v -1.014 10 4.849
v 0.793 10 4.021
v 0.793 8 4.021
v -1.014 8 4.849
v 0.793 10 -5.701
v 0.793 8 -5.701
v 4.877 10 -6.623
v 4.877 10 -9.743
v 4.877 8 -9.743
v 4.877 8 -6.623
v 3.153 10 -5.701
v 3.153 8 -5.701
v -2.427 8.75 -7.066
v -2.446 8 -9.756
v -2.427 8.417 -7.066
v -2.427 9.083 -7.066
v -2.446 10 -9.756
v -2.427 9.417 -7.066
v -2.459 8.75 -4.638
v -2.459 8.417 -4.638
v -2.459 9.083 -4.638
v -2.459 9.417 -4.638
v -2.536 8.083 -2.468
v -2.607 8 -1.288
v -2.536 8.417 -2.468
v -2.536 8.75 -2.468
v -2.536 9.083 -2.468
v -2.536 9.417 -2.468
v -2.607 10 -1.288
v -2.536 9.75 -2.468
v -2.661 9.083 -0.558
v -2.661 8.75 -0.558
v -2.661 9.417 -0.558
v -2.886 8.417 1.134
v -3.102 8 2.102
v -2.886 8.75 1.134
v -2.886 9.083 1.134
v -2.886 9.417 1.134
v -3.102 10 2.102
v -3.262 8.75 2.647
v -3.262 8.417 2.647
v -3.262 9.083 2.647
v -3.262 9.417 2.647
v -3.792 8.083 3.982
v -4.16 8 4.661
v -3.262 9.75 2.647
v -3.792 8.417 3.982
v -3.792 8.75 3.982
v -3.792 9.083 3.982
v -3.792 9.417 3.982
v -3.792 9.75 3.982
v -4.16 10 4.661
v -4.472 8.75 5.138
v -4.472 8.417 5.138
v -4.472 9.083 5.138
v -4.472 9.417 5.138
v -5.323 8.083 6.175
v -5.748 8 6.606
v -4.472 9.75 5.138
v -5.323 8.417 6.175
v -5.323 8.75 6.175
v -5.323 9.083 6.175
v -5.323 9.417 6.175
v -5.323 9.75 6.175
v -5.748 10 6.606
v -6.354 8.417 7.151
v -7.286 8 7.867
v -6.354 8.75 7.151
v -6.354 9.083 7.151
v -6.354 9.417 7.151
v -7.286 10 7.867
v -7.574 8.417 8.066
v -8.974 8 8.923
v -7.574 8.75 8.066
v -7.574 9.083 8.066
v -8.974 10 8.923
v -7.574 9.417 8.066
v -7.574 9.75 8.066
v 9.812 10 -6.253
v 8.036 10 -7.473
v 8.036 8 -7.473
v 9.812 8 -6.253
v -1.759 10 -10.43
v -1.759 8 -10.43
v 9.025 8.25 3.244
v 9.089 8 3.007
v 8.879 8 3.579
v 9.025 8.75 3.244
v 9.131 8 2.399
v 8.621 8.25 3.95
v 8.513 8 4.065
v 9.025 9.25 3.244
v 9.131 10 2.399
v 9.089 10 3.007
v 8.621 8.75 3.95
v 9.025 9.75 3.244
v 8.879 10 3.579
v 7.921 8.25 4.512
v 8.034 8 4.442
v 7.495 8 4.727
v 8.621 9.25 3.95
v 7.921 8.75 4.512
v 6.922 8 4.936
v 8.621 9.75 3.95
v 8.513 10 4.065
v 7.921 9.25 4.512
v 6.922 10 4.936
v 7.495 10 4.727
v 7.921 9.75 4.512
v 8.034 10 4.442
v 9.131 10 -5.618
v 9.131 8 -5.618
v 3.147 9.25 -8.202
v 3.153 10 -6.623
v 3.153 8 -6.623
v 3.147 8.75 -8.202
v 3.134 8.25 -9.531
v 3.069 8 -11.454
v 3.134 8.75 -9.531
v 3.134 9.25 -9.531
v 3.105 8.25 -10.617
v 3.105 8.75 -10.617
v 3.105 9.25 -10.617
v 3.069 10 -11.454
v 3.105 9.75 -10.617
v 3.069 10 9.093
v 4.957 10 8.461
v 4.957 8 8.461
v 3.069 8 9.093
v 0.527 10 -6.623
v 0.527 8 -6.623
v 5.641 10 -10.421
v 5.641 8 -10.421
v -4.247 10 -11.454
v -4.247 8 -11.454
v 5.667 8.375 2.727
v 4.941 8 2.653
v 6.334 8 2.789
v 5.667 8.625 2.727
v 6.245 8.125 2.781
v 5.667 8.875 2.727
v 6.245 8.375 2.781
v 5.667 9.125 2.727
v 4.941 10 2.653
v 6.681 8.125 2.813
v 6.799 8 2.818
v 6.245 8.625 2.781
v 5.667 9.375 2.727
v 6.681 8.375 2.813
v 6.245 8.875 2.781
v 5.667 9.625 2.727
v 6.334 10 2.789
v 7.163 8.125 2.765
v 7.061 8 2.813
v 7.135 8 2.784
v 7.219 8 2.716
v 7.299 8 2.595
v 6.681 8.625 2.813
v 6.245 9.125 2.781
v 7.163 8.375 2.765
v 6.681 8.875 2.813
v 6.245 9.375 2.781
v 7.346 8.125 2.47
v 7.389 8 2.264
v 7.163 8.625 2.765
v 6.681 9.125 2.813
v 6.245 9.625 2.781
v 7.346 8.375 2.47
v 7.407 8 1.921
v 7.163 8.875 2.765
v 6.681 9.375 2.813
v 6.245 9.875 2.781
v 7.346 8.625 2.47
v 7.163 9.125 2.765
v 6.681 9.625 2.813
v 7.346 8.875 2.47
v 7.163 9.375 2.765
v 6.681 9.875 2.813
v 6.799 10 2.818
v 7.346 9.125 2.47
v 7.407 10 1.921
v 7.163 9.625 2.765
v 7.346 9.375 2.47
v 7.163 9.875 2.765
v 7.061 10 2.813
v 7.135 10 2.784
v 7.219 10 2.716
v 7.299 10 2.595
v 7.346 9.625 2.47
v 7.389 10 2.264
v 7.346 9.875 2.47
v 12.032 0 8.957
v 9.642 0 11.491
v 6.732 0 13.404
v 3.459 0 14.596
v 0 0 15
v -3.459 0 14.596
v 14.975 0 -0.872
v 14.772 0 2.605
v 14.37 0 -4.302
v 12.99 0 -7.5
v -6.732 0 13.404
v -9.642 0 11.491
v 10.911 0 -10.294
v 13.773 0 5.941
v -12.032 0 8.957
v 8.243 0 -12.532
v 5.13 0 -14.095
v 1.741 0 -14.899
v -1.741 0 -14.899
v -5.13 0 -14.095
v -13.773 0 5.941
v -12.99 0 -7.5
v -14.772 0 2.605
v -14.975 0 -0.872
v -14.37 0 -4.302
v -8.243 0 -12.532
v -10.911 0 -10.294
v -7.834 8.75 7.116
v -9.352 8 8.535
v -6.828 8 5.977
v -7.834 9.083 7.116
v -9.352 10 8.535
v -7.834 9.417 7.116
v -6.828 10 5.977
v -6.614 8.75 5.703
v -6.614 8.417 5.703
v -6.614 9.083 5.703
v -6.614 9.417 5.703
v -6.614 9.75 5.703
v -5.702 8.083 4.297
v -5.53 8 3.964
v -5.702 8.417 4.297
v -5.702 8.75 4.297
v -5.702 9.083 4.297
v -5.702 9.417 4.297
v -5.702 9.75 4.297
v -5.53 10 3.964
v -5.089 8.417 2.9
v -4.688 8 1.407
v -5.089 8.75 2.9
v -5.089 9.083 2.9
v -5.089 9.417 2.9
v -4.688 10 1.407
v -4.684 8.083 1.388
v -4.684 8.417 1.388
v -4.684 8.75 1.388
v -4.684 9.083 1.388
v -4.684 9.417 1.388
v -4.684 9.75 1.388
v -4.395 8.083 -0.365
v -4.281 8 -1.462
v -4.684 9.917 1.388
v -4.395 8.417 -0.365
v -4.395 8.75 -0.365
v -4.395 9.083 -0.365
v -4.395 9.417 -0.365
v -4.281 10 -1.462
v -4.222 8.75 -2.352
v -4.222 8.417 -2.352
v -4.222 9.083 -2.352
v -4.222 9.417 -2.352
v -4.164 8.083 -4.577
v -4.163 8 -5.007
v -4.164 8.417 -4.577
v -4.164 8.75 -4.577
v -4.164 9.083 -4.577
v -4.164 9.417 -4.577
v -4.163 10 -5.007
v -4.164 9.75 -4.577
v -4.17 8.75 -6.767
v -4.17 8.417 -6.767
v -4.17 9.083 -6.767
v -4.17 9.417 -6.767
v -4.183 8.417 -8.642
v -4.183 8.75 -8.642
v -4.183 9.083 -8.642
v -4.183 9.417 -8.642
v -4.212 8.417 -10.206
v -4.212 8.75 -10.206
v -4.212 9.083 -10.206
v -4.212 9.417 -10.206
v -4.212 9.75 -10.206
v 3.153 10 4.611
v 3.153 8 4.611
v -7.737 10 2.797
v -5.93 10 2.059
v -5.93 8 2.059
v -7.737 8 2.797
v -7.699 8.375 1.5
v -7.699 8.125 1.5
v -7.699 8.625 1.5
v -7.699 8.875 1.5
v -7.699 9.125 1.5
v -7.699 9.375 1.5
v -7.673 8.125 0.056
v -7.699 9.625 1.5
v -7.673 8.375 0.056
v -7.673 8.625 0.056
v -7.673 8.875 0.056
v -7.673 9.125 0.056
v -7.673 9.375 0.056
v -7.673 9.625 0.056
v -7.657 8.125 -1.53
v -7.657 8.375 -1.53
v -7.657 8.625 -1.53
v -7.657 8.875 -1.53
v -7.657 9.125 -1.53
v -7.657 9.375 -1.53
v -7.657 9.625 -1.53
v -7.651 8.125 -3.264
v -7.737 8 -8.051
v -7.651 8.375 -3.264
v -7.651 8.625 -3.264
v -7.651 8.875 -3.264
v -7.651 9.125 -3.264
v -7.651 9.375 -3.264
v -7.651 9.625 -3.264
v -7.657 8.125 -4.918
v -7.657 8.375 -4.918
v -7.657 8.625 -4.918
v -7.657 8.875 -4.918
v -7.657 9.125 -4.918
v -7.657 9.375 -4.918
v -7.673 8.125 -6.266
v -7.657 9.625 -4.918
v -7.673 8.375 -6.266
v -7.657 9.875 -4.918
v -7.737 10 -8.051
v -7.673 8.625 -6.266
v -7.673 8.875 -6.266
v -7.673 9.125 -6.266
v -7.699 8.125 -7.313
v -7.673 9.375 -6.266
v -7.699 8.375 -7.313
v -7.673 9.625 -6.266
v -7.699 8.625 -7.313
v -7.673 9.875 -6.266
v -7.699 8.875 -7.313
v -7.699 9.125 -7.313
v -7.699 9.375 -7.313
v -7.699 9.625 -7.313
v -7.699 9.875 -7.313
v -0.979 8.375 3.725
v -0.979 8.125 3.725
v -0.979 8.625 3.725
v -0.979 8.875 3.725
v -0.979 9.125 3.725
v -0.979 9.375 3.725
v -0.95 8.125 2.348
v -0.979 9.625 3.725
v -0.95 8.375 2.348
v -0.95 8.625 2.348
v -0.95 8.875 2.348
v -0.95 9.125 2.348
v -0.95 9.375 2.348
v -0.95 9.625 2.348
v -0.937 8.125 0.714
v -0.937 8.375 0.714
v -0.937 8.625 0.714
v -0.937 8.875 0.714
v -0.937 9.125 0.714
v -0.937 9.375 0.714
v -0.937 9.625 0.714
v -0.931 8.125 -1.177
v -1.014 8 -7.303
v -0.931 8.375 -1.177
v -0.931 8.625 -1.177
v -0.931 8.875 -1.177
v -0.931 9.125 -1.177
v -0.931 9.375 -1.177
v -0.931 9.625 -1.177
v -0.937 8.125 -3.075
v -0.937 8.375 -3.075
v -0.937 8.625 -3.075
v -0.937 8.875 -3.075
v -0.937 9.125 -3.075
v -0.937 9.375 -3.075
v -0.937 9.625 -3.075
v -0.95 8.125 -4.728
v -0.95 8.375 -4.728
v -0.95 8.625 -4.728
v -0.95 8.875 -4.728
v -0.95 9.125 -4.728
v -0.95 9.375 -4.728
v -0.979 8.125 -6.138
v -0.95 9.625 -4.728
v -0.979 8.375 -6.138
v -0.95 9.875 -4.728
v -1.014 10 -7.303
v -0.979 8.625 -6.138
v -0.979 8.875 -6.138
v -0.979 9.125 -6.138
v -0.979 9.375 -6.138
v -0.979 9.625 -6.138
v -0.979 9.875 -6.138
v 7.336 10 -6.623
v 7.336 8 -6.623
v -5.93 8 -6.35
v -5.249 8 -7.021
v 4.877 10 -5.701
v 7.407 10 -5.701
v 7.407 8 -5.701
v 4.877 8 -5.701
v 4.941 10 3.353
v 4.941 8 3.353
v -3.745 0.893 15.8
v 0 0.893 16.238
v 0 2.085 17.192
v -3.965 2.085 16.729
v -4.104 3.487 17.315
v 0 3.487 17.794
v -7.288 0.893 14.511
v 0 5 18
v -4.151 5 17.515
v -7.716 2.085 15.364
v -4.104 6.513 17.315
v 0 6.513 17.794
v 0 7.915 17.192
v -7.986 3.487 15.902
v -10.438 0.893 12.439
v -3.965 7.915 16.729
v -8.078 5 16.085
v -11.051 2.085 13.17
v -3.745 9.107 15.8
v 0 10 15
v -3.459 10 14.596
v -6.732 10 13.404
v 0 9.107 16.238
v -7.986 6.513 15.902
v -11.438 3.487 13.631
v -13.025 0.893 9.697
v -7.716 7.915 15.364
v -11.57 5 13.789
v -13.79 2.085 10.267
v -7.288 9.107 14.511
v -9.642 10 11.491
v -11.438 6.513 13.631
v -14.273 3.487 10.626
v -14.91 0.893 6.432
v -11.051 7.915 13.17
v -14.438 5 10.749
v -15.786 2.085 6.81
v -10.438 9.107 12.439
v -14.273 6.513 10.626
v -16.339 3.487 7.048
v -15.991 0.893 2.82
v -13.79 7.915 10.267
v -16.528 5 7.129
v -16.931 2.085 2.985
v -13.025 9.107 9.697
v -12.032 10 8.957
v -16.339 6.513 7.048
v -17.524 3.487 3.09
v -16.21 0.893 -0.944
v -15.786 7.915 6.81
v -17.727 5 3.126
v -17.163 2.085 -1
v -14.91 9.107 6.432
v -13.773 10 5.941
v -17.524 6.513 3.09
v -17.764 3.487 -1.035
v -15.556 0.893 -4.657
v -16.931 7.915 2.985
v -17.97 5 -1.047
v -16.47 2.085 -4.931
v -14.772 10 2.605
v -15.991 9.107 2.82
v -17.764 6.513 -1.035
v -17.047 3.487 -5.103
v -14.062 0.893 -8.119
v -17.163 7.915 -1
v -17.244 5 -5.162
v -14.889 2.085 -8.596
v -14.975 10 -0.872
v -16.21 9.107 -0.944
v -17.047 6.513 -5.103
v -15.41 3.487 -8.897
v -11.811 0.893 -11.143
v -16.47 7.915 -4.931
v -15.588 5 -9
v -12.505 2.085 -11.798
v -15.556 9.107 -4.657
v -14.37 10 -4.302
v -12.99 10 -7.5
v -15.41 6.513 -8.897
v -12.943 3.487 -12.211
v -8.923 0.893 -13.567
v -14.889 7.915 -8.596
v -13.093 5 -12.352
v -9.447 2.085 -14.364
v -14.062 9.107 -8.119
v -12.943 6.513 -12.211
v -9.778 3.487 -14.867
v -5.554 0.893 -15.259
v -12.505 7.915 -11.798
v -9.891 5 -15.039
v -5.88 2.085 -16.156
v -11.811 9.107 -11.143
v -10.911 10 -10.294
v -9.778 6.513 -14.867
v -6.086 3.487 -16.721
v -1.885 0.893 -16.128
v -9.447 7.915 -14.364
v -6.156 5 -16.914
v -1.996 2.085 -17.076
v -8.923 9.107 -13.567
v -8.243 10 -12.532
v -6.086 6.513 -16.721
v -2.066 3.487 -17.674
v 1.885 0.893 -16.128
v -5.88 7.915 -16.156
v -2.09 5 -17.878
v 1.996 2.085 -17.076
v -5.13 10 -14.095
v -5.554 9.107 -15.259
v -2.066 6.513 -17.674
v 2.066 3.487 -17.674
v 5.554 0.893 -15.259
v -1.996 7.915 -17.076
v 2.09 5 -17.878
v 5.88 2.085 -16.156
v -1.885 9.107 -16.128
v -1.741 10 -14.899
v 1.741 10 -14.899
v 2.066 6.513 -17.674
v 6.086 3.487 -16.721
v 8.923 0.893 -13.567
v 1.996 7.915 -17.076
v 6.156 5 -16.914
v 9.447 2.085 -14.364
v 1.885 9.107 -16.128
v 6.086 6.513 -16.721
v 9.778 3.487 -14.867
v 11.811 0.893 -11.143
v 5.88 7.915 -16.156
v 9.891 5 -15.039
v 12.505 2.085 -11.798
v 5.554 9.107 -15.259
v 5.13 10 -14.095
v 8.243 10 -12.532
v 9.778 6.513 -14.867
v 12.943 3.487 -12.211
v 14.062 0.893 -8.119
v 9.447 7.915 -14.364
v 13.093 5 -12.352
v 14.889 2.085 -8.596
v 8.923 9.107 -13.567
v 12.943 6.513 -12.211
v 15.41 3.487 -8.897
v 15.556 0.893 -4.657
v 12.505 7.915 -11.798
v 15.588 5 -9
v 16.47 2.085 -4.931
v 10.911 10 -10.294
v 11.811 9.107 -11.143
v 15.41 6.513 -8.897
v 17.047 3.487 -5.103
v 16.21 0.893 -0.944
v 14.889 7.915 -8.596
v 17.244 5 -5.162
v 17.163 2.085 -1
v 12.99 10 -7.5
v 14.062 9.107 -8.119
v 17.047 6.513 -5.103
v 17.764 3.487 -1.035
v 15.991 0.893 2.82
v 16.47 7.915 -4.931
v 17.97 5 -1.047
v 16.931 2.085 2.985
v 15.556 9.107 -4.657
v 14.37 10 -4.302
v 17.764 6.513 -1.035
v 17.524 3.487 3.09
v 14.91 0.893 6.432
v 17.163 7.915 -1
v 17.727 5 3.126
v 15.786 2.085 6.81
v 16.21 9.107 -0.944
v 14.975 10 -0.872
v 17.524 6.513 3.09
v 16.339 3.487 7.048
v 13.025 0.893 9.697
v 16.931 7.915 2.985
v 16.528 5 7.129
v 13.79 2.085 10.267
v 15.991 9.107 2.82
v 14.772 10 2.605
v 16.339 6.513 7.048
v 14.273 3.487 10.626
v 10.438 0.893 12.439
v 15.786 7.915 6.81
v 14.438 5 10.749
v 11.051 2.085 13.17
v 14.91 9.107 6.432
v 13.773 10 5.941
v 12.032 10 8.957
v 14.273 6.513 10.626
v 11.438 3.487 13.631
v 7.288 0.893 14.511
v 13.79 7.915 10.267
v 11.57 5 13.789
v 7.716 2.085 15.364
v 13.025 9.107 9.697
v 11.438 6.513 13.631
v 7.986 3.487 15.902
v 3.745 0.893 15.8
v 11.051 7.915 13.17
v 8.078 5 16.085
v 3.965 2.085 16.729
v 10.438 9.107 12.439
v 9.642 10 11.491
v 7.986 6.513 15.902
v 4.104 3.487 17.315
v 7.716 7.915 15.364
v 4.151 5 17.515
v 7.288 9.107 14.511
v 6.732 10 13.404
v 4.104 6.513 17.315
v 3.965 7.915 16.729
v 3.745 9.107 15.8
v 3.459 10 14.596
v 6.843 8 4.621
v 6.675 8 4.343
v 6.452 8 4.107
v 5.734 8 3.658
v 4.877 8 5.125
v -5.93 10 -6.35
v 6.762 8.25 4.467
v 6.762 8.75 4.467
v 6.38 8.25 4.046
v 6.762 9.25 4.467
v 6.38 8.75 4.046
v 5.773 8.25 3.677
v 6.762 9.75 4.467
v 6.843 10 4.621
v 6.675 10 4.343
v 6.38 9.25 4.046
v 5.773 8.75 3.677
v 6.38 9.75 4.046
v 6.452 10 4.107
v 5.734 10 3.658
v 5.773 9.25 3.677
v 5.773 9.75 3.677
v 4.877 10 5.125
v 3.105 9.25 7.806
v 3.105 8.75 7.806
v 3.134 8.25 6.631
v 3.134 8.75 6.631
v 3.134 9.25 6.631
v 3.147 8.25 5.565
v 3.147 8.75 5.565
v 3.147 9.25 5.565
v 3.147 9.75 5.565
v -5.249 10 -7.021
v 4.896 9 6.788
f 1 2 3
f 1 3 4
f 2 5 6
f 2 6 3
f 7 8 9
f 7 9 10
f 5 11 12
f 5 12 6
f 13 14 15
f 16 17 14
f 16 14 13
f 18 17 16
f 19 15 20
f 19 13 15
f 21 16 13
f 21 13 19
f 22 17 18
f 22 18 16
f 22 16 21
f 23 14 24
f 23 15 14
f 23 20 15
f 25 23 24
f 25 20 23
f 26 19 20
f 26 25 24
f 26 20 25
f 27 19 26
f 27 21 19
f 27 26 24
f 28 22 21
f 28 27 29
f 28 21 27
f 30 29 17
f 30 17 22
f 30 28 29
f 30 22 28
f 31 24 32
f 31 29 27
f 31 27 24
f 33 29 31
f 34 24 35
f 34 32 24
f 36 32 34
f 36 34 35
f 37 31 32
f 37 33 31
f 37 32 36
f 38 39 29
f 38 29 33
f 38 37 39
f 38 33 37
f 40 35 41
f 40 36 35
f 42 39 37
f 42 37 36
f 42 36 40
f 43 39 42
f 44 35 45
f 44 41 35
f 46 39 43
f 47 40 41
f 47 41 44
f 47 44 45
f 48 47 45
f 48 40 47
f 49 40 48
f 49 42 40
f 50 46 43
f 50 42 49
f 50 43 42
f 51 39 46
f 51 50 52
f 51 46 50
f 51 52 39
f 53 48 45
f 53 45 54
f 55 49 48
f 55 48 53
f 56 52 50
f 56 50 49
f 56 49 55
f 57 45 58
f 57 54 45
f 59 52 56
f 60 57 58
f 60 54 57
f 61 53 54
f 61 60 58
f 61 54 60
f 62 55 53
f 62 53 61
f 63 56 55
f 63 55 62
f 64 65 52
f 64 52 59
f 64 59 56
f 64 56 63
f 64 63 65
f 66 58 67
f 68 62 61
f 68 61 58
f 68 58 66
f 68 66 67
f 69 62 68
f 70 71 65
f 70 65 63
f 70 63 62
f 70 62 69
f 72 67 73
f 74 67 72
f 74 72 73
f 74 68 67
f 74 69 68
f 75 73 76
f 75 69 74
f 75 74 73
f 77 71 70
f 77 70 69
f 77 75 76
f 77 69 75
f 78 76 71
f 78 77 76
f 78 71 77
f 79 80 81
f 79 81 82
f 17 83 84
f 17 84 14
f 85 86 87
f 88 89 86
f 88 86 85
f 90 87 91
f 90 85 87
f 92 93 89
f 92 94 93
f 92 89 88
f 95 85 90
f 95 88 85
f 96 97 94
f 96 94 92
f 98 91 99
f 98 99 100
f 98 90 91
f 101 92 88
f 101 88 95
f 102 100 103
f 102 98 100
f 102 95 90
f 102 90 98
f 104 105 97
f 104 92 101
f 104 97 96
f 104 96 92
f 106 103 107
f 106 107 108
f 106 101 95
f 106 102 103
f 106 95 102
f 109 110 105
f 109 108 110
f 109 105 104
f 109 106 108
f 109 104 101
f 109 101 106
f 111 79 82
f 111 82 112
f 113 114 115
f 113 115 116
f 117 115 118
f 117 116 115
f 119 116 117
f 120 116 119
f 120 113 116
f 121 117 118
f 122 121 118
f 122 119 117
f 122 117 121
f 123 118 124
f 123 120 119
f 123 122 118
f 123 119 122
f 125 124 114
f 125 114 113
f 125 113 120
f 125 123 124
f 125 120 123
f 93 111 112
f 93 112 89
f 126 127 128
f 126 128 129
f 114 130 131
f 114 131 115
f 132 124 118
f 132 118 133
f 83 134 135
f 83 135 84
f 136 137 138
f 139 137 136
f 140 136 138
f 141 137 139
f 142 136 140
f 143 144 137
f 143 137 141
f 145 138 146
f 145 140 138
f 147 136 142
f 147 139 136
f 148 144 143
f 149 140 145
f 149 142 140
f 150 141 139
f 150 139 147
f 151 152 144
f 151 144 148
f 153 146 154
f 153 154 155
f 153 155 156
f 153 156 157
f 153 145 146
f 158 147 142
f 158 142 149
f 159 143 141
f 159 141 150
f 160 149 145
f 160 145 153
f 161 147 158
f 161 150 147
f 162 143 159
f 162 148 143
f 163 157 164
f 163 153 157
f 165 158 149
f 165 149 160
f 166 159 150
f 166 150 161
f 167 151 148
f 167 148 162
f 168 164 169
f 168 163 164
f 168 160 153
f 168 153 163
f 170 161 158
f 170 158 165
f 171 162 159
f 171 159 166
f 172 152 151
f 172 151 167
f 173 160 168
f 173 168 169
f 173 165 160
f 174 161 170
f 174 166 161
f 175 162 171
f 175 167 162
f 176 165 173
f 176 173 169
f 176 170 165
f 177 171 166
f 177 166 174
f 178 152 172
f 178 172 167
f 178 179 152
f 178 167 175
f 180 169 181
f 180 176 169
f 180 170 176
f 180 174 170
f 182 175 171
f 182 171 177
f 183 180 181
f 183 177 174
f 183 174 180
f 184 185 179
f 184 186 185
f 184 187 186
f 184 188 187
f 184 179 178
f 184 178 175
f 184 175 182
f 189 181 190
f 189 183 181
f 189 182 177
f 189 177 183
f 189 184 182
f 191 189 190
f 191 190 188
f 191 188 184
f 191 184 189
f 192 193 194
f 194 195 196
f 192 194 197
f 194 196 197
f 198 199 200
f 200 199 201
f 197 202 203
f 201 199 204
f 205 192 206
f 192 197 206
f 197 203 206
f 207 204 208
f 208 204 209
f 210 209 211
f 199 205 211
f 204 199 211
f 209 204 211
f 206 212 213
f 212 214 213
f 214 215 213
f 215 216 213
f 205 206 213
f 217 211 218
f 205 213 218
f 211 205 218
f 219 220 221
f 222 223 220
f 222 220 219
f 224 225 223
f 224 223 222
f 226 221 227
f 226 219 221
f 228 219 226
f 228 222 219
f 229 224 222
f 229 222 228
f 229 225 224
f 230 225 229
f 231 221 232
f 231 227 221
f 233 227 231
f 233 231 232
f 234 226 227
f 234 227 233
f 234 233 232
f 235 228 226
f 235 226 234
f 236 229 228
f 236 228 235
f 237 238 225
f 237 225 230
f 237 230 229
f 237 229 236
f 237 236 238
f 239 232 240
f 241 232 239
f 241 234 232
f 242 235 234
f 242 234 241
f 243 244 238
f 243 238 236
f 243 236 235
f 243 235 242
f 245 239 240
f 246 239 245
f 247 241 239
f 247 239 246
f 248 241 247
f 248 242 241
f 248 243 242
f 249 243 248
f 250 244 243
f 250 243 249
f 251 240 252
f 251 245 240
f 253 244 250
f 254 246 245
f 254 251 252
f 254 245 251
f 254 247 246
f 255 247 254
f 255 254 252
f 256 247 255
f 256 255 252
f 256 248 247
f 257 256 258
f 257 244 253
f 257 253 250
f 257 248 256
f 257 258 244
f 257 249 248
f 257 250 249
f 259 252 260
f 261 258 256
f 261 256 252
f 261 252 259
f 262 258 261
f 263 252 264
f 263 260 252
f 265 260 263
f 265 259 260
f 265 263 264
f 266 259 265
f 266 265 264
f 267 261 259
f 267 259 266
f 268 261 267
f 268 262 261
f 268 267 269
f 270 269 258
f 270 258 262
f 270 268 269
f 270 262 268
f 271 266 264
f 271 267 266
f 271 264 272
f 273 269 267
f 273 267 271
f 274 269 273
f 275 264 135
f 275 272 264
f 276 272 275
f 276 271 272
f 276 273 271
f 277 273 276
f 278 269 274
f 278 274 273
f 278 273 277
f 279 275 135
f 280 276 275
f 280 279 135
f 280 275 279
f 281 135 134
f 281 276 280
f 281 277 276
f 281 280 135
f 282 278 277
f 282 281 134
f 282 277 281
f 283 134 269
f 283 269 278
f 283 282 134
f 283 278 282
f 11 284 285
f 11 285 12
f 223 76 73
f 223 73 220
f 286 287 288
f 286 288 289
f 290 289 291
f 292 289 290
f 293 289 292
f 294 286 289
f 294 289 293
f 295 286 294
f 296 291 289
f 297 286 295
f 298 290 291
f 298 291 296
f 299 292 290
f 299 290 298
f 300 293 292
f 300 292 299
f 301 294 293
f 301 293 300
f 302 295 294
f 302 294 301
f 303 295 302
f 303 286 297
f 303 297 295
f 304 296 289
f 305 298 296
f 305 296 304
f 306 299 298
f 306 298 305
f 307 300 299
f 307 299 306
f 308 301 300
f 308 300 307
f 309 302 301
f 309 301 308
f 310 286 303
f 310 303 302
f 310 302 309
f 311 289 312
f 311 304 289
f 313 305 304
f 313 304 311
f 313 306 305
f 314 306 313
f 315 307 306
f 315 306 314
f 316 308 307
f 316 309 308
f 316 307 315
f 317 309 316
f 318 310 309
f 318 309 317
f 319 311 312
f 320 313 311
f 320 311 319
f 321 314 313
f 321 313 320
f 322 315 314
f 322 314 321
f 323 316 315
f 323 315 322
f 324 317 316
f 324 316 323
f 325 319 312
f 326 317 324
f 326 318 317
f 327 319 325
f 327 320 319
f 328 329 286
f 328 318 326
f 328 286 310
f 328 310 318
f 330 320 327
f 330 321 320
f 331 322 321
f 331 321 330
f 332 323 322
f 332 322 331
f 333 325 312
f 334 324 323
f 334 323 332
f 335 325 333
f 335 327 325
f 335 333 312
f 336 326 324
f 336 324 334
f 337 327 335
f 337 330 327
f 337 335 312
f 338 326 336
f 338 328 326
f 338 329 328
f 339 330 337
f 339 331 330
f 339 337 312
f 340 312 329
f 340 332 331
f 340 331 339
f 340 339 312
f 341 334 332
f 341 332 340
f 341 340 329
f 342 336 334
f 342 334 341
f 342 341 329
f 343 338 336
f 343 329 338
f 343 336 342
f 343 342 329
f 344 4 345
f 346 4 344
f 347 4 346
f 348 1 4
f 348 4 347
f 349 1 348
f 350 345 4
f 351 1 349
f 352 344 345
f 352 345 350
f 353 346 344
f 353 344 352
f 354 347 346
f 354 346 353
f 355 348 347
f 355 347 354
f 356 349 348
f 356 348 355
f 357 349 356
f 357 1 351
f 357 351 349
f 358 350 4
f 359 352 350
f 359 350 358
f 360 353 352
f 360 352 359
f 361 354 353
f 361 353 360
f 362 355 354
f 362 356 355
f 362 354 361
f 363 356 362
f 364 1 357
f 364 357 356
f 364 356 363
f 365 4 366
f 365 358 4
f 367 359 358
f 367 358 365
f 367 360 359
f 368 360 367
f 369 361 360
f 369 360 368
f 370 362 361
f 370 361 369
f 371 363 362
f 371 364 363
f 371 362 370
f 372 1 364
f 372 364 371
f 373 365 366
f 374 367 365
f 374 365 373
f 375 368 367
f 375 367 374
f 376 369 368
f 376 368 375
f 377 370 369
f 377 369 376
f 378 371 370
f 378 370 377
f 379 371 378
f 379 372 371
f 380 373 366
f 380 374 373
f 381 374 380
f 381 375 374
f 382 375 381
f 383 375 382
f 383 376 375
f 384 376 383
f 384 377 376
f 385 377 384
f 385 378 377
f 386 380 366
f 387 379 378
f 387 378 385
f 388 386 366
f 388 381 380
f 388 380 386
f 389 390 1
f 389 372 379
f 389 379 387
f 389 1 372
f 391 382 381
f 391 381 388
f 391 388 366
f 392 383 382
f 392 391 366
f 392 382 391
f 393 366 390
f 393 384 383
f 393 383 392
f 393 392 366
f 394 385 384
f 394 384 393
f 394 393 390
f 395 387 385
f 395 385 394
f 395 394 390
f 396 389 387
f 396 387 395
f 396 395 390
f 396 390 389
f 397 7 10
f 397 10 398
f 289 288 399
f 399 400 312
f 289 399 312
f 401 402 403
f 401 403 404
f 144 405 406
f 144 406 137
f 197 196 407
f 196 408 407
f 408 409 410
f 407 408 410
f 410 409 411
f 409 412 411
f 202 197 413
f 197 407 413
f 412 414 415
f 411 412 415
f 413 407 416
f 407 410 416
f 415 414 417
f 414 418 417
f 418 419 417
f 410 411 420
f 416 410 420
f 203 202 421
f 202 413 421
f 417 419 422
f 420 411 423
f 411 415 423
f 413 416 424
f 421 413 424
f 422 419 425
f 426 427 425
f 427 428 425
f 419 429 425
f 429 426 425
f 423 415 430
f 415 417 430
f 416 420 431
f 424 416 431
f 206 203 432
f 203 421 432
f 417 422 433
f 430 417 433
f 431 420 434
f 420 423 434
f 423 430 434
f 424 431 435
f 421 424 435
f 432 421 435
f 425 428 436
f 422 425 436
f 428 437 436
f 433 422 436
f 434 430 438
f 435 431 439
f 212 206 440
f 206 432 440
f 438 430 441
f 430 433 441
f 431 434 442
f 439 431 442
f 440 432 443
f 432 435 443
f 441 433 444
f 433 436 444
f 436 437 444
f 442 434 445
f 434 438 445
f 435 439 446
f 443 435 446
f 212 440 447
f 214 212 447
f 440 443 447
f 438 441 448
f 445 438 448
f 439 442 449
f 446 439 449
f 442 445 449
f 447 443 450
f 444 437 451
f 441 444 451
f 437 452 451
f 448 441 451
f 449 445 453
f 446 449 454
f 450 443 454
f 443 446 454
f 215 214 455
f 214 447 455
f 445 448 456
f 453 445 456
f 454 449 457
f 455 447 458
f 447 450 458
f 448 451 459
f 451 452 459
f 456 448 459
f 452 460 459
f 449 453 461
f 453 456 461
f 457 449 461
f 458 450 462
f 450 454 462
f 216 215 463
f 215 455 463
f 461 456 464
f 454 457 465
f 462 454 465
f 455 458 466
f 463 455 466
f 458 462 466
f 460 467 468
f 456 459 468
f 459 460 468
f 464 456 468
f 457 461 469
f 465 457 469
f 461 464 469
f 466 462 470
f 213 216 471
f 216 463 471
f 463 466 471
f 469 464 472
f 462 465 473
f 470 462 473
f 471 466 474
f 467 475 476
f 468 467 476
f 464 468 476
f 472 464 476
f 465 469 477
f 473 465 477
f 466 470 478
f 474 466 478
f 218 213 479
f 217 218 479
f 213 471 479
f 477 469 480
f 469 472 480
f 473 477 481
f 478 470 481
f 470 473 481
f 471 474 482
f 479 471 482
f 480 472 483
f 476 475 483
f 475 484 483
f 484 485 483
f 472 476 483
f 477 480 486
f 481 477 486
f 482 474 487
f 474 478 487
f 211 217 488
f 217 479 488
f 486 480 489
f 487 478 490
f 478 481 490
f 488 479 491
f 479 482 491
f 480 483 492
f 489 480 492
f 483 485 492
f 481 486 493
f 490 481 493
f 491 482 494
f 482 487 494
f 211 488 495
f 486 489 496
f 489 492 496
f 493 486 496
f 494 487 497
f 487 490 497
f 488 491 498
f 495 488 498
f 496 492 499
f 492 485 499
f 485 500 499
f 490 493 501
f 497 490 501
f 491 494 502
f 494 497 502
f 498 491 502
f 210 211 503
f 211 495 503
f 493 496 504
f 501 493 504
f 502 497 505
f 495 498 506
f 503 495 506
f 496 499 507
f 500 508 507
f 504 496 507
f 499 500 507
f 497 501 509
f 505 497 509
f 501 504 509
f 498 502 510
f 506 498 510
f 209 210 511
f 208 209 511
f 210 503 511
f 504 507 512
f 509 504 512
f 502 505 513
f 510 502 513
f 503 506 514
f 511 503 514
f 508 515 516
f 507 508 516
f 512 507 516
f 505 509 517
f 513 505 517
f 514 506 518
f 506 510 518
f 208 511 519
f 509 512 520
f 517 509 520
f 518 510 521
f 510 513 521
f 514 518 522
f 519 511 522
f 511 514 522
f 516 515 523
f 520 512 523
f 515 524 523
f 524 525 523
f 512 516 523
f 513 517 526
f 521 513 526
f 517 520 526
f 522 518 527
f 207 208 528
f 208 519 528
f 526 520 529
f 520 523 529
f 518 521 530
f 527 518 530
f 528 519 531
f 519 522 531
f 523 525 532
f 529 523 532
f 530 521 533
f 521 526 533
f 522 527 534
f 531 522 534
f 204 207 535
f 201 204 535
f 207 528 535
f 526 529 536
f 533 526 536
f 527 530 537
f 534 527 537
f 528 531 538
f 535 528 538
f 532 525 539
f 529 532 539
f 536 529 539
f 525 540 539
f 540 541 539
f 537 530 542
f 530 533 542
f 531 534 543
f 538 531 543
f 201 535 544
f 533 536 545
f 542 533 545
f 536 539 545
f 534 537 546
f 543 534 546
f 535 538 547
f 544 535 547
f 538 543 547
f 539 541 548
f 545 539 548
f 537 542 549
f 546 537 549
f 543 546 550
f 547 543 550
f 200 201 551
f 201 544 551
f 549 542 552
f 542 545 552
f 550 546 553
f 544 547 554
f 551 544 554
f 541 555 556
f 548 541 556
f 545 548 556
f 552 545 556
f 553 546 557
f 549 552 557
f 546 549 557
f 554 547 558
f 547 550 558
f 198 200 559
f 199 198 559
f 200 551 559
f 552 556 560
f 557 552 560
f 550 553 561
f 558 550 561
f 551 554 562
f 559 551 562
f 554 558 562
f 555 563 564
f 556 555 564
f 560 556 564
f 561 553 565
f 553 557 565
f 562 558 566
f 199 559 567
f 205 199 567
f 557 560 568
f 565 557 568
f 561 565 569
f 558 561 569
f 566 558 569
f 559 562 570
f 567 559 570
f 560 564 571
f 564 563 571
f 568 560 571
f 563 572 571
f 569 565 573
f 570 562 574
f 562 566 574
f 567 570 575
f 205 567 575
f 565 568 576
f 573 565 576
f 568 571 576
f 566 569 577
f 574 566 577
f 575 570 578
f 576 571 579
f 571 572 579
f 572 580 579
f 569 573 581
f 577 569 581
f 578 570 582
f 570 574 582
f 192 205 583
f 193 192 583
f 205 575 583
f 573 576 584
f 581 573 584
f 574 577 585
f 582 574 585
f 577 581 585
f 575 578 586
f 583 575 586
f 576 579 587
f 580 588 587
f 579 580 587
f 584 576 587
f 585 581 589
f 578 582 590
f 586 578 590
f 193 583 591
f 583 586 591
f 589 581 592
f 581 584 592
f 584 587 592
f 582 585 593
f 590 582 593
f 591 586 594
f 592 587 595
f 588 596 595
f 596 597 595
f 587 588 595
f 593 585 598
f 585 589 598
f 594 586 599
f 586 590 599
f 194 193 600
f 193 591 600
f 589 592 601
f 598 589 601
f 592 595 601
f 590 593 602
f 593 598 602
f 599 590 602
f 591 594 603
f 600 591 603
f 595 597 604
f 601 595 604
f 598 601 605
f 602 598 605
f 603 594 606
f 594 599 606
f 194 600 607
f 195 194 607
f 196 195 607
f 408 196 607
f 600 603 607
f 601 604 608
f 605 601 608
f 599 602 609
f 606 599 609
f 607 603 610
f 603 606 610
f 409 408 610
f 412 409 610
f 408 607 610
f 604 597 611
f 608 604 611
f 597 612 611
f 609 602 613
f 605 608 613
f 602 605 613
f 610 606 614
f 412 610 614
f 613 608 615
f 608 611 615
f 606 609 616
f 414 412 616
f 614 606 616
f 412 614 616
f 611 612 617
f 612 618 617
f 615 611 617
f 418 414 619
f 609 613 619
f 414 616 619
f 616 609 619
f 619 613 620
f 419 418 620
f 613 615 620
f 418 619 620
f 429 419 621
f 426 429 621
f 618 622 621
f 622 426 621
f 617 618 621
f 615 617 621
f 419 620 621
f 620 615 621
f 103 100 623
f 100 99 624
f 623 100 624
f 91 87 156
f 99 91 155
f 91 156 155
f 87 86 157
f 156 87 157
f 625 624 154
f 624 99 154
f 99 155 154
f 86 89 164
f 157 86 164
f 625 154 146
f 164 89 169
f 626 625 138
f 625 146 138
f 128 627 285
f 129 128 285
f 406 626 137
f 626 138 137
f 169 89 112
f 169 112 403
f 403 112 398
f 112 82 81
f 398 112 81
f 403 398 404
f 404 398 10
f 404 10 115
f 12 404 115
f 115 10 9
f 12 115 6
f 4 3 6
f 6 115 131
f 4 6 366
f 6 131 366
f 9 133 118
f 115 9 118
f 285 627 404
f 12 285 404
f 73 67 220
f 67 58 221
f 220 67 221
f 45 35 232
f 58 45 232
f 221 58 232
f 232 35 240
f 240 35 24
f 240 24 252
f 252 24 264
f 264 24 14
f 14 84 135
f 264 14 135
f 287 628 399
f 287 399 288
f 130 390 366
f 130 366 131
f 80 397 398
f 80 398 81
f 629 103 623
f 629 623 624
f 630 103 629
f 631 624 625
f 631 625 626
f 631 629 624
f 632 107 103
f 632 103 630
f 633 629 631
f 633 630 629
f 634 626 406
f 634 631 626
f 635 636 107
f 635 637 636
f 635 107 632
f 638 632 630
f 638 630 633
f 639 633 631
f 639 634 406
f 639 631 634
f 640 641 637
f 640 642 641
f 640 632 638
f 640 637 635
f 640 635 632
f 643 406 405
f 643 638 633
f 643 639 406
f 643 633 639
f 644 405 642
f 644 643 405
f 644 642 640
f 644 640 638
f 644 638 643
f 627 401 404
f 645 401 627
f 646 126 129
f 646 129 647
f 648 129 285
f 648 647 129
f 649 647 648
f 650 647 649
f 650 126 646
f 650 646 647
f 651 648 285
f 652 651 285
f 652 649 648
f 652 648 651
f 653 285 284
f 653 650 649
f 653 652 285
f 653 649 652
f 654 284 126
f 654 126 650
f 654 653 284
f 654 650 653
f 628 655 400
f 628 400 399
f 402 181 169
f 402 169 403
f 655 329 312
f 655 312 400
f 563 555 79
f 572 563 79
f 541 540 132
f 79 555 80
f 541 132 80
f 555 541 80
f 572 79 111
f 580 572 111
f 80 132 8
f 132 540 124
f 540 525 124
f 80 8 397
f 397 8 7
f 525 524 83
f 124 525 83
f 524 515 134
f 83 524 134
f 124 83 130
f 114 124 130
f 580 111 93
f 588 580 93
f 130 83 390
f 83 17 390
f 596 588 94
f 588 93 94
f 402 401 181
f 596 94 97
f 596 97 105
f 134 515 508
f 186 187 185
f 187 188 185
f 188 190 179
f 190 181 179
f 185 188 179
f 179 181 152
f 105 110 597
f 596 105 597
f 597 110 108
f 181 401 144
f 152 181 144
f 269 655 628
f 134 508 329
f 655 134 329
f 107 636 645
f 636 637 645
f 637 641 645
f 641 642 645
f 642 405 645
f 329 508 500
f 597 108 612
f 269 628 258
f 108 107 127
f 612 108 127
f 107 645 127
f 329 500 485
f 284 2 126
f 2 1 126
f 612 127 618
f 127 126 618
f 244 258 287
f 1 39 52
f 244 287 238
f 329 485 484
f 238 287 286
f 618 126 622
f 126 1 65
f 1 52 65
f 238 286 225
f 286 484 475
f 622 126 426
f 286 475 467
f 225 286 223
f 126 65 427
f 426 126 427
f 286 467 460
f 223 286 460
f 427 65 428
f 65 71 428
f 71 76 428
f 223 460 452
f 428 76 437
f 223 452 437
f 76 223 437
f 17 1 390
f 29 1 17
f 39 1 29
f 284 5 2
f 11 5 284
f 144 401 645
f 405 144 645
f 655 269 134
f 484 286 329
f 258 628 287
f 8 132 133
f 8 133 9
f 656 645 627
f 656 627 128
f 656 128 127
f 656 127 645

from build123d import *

# Parameters (mm, degrees)
CUT_EXTRUDE_1_DEPTH = 2


with BuildPart() as part:
    # 草图1 → 旋转1 (revolve)
    with BuildSketch(Plane.XY, mode=Mode.PRIVATE) as revolve_1_sk:
        with BuildLine():
            Line((0, 0), (15, 0))
            ThreePointArc((15, 0), (18, 5), (15, 10))
            Line((15, 10), (0, 10))
            Line((0, 10), (0, 0))
        make_face()
    revolve(revolve_1_sk.sketch.rotate(Axis((0, 13.411477292, 0), (0, -1, 0)), 90), axis=Axis((0, 13.411477292, 0), (0, -1, 0)))

    # 草图3 → 切除-拉伸1 (cut)
    with BuildSketch(Plane(origin=(0, 10, 0), x_dir=(1, 0, 0), z_dir=(0, 1, 0))):
        with BuildLine():
            add(Edge.make_bspline(
                [(-7.737435646, -2.797446042), (-7.731068719, -2.587685086), (-7.717945409, -2.155332343), (-7.696642932, -1.488687912), (-7.686423073, -0.784380082), (-7.672167654, -0.044911976), (-7.662660109, 0.731003875), (-7.657710892, 1.542239007), (-7.648610401, 2.390894981), (-7.65186825, 3.256706013), (-7.648559979, 4.1032554), (-7.65746445, 4.891980565), (-7.662502543, 5.604758223), (-7.671605944, 6.241565546), (-7.685936074, 6.8022931), (-7.695789632, 7.287287836), (-7.716164539, 7.694960994), (-7.730854842, 7.941006207), (-7.737435646, 8.051226903)],
                knots=[0, 0, 0, 0, 0.928317114, 1.913418291, 2.950357829, 4.044097515, 5.185102596, 6.382865837, 7.632702554, 8.939312537, 10.212783862, 11.377409509, 12.428421057, 13.365879284, 14.194562146, 14.909661131, 15.511561687, 16, 16, 16, 16], degree=3))
            Line((-7.737435646, 8.051226903), (-5.249207906, 7.020619026))
            Line((-5.249207906, 7.020619026), (-5.929858591, 6.349600191))
            Line((-5.929858591, 6.349600191), (-5.929858591, -2.059004261))
            Line((-5.929858591, -2.059004261), (-7.737435646, -2.797446042))
        make_face()
        with BuildLine():
            add(Edge.make_bspline(
                [(-9.352375714, -8.534817617), (-9.084525015, -8.300974918), (-8.562369969, -7.845115942), (-7.839466918, -7.133926567), (-7.190646214, -6.425865151), (-6.614868907, -5.721727451), (-6.117599742, -5.01766043), (-5.699034732, -4.312825243), (-5.35196567, -3.611575818), (-5.078196611, -2.899933759), (-4.858394528, -2.160239778), (-4.674985415, -1.371412367), (-4.513140358, -0.524594418), (-4.388643582, 0.382421036), (-4.283467988, 1.346814475), (-4.217243739, 2.370936396), (-4.169114628, 3.45422046), (-4.163132935, 4.574135062), (-4.162447067, 5.68500678), (-4.170367209, 6.74022891), (-4.177021693, 7.717319618), (-4.181368154, 8.616338485), (-4.194730299, 9.437192973), (-4.211775037, 10.179872076), (-4.226060685, 10.843485892), (-4.240662817, 11.259714785), (-4.247495577, 11.454480328)],
                knots=[0, 0, 0, 0, 1.185402125, 2.310853403, 3.379298985, 4.386389788, 5.341776688, 6.250603628, 7.117198236, 7.947562309, 8.789765669, 9.688220653, 10.647060204, 11.663458785, 12.7400909, 13.881155971, 15.084787921, 16.355264848, 17.614955996, 18.789024112, 19.873880758, 20.873094693, 21.786749924, 22.611273472, 23.350174675, 24, 24, 24, 24], degree=3))
            Line((-4.247495577, 11.454480328), (-1.759267838, 10.430293684))
            Line((-1.759267838, 10.430293684), (-2.446339755, 9.756064232))
            add(Edge.make_bspline(
                [(-2.446339755, 9.756064232), (-2.440091603, 9.296954134), (-2.427886973, 8.400166089), (-2.425054866, 7.088026543), (-2.433852361, 5.841156766), (-2.457190325, 4.659621552), (-2.487940385, 3.542189591), (-2.532130363, 2.488939398), (-2.591199959, 1.501176574), (-2.654809669, 0.574553083), (-2.745066202, -0.298269112), (-2.877247045, -1.122116359), (-3.041703355, -1.903705624), (-3.251953741, -2.638406345), (-3.493159764, -3.332378276), (-3.78089571, -3.978119394), (-4.100727381, -4.582126813), (-4.465575897, -5.142882654), (-4.871083747, -5.674414465), (-5.322135975, -6.183582916), (-5.815645595, -6.680645685), (-6.355725979, -7.162346781), (-6.944200864, -7.627281526), (-7.57898216, -8.076065119), (-8.255596092, -8.514663533), (-8.73132227, -8.785443356), (-8.973522975, -8.923302207)],
                knots=[0, 0, 0, 0, 1.560783084, 3.048705779, 4.460269439, 5.799274246, 7.065800622, 8.260132026, 9.382529971, 10.429410577, 11.417304408, 12.364078358, 13.264555336, 14.130553639, 14.960140012, 15.759842068, 16.531300228, 17.281042902, 18.03120911, 18.801912066, 19.591647171, 20.410984061, 21.260379231, 22.139595362, 23.052834729, 24, 24, 24, 24], degree=3))
            Line((-8.973522975, -8.923302207), (-9.352375714, -8.534817617))
        make_face()
        with BuildLine():
            add(Edge.make_bspline(
                [(3.152975313, 6.622502588), (3.153588126, 6.89540738), (3.154770514, 7.421962128), (3.146611659, 8.180724822), (3.140028092, 8.877422102), (3.135631354, 9.512118402), (3.122401095, 10.084693336), (3.105340851, 10.596188458), (3.091104619, 11.045807919), (3.076344341, 11.325003722), (3.069499286, 11.454480328)],
                knots=[0, 0, 0, 0, 1.355131449, 2.614651405, 3.767890675, 4.814850097, 5.76633671, 6.611718708, 7.356186779, 8, 8, 8, 8], degree=3))
            Line((3.069499286, 11.454480328), (5.641203053, 10.420661835))
            Line((5.641203053, 10.420661835), (4.87707634, 9.743221766))
            Line((4.87707634, 9.743221766), (4.87707634, 6.622502588))
            Line((4.87707634, 6.622502588), (7.336408532, 6.622502588))
            Line((7.336408532, 6.622502588), (8.036322916, 7.473315944))
            Line((8.036322916, 7.473315944), (9.811793806, 6.253281698))
            Line((9.811793806, 6.253281698), (9.131143121, 5.617579643))
            Line((9.131143121, 5.617579643), (9.131143121, -2.399329604))
            add(Edge.make_bspline(
                [(9.131143121, -2.399329604), (9.131395669, -2.546397527), (9.131885996, -2.831932311), (9.038977853, -3.246324843), (8.869656202, -3.623256102), (8.626107599, -3.965580357), (8.304608549, -4.264870746), (7.911665558, -4.529495739), (7.446925145, -4.762008048), (7.102712639, -4.875966944), (6.922239012, -4.93571659)],
                knots=[0, 0, 0, 0, 0.96219561, 1.868118553, 2.760343656, 3.656205337, 4.604451048, 5.624548914, 6.75453022, 8, 8, 8, 8], degree=3))
            add(Edge.make_bspline(
                [(6.922239012, -4.93571659), (6.909123756, -4.854277288), (6.882545497, -4.689239347), (6.76543208, -4.457080757), (6.597014494, -4.239577573), (6.375934205, -4.032062925), (6.094335298, -3.845055724), (5.760972018, -3.665348344), (5.3728269, -3.494916639), (5.089884589, -3.401790672), (4.941288669, -3.352882686)],
                knots=[0, 0, 0, 0, 0.736733597, 1.493001439, 2.301925965, 3.199030657, 4.20096543, 5.327273661, 6.596334963, 8, 8, 8, 8], degree=3))
            Line((4.941288669, -3.352882686), (4.941288669, -2.652968302))
            add(Edge.make_bspline(
                [(4.941288669, -2.652968302), (5.067580967, -2.665728809), (5.309464653, -2.690168608), (5.652829722, -2.726155562), (5.961218582, -2.754387456), (6.23180788, -2.780889296), (6.468341952, -2.800346265), (6.66736422, -2.813966281), (6.831367995, -2.818966606), (6.961738085, -2.825714194), (7.073934615, -2.817350678), (7.1666596, -2.768928995), (7.242752738, -2.694357526), (7.305466829, -2.593339306), (7.350603643, -2.463928678), (7.386512175, -2.307952974), (7.403655814, -2.123586173), (7.405861386, -1.99160248), (7.407042094, -1.920947754)],
                knots=[0, 0, 0, 0, 1.935290813, 3.70660193, 5.263620808, 6.65666223, 7.851791597, 8.881808183, 9.698291315, 10.351159825, 10.877354834, 11.388145665, 11.907465341, 12.486877492, 13.183923572, 13.987423657, 14.922609108, 16, 16, 16, 16], degree=3))
            Line((7.407042094, -1.920947754), (7.407042094, 5.70105567))
            Line((7.407042094, 5.70105567), (4.87707634, 5.70105567))
            Line((4.87707634, 5.70105567), (4.87707634, -5.12514296))
            add(Edge.make_bspline(
                [(4.87707634, -5.12514296), (4.880062675, -5.679591911), (4.886054434, -6.792034181), (4.933528892, -7.903479956), (4.957341751, -8.460973439)],
                knots=[0, 0, 0, 0, 0.996813886, 2, 2, 2, 2], degree=3))
            Line((4.957341751, -8.460973439), (3.069499286, -9.093464878))
            add(Edge.make_bspline(
                [(3.069499286, -9.093464878), (3.076173355, -8.874079729), (3.089227829, -8.444962546), (3.104114646, -7.815620094), (3.12099665, -7.214217278), (3.135029943, -6.640611688), (3.139755388, -6.093672162), (3.145931121, -5.574624741), (3.154576391, -5.083429325), (3.153498098, -4.765557311), (3.152975313, -4.61144433)],
                knots=[0, 0, 0, 0, 1.175035445, 2.298368424, 3.370154139, 4.395977557, 5.370047505, 6.298285367, 7.17496255, 8, 8, 8, 8], degree=3))
            Line((3.152975313, -4.61144433), (3.152975313, 5.70105567))
            Line((3.152975313, 5.70105567), (0.793172231, 5.70105567))
            Line((0.793172231, 5.70105567), (0.793172231, -4.020690905))
            Line((0.793172231, -4.020690905), (-1.014404824, -4.849029946))
            add(Edge.make_bspline(
                [(-1.014404824, -4.849029946), (-1.00758523, -4.672458776), (-0.993121685, -4.297972388), (-0.978711974, -3.703916925), (-0.961773948, -3.046857597), (-0.948257418, -2.325535215), (-0.943934204, -1.541021297), (-0.937399912, -0.69128389), (-0.928883861, 0.221590297), (-0.931985888, 1.178367317), (-0.928877241, 2.136214544), (-0.93744001, 3.054439424), (-0.943919928, 3.911668811), (-0.948313778, 4.707953238), (-0.961785981, 5.443188246), (-0.978767285, 6.117371114), (-0.993218695, 6.730684991), (-1.007592937, 7.119089948), (-1.014404824, 7.303153273)],
                knots=[0, 0, 0, 0, 0.697843585, 1.480043001, 2.346745801, 3.293646528, 4.329188613, 5.445032886, 6.649632591, 7.934507307, 9.223608584, 10.432434748, 11.560958345, 12.609179698, 13.577209938, 14.465039412, 15.272589231, 16, 16, 16, 16], degree=3))
            Line((-1.014404824, 7.303153273), (0.526691066, 6.622502588))
            Line((0.526691066, 6.622502588), (3.152975313, 6.622502588))
        make_face()
    extrude(amount=-CUT_EXTRUDE_1_DEPTH, mode=Mode.SUBTRACT)


solid = part.part
